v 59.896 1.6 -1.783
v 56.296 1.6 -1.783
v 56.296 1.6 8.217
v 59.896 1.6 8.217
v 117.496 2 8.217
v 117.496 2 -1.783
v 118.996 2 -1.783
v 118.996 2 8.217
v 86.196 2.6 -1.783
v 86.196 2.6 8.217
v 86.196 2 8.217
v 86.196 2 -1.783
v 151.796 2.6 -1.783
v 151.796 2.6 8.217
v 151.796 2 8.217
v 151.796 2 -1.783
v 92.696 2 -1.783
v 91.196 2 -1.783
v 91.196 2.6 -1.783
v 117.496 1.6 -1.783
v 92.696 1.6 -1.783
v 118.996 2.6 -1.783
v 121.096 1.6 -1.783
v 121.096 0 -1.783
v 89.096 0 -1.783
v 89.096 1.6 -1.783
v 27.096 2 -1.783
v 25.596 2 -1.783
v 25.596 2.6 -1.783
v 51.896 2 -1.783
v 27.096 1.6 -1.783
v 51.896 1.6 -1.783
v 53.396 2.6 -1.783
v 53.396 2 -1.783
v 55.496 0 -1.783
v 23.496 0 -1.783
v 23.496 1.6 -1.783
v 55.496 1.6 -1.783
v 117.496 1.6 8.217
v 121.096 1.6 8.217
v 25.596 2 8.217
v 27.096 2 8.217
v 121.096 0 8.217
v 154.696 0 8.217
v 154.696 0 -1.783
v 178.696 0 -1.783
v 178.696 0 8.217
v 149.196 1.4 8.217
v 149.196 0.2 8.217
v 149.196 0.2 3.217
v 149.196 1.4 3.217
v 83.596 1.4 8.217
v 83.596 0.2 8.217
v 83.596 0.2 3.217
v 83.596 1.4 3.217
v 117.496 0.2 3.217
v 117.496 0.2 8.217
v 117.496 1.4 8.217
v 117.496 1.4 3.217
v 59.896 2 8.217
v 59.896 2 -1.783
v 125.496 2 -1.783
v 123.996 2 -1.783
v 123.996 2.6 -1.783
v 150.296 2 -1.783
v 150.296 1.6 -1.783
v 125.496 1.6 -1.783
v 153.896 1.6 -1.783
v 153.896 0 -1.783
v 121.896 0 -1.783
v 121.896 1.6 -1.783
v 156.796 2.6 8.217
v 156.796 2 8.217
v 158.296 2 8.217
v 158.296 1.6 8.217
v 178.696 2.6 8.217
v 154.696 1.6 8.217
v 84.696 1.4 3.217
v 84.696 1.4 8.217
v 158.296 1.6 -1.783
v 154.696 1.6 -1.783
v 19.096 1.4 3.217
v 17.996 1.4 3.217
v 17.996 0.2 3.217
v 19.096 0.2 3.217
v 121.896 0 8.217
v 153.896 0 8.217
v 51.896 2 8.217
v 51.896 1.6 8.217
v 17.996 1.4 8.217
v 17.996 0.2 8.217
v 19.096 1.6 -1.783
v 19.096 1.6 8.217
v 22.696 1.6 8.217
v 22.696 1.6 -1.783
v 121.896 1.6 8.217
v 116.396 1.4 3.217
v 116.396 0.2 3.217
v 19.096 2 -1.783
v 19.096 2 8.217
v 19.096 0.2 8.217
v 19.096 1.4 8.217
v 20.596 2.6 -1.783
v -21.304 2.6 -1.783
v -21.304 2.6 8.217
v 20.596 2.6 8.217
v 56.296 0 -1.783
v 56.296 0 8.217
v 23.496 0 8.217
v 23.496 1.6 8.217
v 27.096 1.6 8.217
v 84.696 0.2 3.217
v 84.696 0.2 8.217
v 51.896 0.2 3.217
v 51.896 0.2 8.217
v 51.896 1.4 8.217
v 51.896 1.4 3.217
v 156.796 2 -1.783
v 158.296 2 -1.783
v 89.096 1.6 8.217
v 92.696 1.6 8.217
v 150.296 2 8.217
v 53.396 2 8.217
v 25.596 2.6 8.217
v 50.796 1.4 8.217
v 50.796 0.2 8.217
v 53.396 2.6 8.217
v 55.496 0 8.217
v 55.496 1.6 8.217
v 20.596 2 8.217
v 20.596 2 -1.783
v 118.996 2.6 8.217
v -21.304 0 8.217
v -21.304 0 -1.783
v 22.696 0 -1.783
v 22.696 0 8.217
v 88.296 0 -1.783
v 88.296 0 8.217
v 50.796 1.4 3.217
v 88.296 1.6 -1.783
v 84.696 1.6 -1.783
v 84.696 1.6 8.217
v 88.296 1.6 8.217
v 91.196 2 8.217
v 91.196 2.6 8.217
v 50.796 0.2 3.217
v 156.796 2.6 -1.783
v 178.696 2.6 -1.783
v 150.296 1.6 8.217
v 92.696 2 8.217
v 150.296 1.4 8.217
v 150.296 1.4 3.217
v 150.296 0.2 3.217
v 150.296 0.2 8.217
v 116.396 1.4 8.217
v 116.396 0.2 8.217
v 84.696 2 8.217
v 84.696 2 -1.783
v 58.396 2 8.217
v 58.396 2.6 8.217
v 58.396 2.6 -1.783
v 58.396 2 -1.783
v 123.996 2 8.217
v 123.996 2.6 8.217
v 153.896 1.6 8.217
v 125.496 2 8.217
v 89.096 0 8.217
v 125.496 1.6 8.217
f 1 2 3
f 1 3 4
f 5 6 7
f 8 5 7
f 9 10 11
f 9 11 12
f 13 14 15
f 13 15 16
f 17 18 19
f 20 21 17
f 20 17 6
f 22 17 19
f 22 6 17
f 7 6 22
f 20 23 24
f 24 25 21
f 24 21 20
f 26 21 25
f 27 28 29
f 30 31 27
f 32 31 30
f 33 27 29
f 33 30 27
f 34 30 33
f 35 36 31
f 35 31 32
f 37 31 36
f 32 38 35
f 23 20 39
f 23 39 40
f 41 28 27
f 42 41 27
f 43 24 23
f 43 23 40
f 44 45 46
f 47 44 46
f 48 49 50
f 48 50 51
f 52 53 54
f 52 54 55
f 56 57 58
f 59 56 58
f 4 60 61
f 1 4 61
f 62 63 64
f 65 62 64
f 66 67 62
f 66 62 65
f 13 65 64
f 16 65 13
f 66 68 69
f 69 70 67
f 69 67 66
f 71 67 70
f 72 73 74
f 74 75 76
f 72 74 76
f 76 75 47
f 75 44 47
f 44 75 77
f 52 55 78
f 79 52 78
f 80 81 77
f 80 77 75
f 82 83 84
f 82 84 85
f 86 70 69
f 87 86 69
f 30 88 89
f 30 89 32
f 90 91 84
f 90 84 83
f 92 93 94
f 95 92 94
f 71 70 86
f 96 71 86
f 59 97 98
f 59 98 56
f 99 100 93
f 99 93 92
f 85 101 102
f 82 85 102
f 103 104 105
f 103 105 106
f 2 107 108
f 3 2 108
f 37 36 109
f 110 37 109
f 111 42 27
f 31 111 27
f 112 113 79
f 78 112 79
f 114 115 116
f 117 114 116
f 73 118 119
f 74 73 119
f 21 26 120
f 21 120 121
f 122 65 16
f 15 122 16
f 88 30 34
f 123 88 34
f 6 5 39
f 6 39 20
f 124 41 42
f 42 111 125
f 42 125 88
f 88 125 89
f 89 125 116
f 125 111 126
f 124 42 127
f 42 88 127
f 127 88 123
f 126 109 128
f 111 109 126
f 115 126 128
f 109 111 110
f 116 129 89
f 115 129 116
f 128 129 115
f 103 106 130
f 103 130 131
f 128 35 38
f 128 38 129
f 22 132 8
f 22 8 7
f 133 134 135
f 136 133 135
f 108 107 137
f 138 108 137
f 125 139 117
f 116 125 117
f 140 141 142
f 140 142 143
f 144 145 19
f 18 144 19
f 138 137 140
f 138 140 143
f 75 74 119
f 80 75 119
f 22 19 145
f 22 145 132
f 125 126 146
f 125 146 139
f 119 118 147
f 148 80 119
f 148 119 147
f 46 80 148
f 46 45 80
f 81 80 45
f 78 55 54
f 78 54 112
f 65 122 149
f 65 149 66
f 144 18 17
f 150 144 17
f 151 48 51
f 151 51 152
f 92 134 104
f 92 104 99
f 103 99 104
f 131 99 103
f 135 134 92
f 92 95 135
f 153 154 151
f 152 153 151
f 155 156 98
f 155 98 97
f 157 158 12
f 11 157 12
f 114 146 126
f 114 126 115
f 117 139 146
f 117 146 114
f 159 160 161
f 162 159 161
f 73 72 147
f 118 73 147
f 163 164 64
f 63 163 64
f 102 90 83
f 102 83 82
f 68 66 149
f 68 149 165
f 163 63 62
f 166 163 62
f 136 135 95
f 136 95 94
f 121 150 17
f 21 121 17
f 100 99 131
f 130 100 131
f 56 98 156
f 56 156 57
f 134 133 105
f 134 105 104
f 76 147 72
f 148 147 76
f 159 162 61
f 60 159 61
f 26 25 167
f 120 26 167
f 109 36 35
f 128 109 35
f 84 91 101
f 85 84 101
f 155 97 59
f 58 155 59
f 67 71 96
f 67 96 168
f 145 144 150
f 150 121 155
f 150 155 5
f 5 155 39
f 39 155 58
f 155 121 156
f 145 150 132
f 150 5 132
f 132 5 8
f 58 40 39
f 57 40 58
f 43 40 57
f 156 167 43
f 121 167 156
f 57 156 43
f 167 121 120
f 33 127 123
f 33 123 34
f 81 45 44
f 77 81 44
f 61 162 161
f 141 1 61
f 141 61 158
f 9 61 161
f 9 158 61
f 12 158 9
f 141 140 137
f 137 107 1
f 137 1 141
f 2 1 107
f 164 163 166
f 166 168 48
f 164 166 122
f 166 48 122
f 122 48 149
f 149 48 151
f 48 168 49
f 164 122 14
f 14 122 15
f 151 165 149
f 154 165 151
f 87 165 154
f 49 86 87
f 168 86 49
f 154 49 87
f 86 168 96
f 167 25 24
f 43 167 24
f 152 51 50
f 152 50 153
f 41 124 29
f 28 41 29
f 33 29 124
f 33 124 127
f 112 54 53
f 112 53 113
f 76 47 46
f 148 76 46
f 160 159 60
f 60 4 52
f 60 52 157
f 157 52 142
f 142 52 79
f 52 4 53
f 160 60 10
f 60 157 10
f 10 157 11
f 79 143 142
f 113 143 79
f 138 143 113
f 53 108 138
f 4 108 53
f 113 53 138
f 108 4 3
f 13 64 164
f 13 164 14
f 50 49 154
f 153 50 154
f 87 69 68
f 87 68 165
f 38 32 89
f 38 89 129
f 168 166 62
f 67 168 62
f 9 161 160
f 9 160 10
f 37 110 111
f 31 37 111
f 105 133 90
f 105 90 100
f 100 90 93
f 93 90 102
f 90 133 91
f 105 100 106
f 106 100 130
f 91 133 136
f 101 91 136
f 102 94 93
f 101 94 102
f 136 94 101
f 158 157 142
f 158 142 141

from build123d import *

# Parameters (mm, degrees)
SKETCH1_W             = 200
SKETCH1_H             = 10
BOSS_EXTRUDE1_DEPTH   = 2.6
SKETCH3_W             = 0.8
SKETCH3_H             = 10
CUT_EXTRUDE1_DEPTH    = 2
SKETCH4_W             = 5
SKETCH4_H             = 10
CUT_EXTRUDE2_DEPTH    = 0.6
SKETCH5_W             = 5
SKETCH5_H             = 10
BOSS_EXTRUDE2_DEPTH   = 0.6
BOSS_EXTRUDE2_2_DEPTH = 0.6
BOSS_EXTRUDE2_3_DEPTH = 0.6
BOSS_EXTRUDE2_4_DEPTH = 0.6
BOSS_EXTRUDE2_5_DEPTH = 0.6
SKETCH6_W             = 3.6
SKETCH6_H             = 10
CUT_EXTRUDE3_DEPTH    = 0.4
SKETCH11_W            = 1.1
SKETCH11_H            = 1.2
CUT_EXTRUDE4_DEPTH    = 5
SKETCH12_W            = 5
SKETCH12_H            = 10
CUT_EXTRUDE6_DEPTH    = 0.6


with BuildPart() as part:
    # Sketch1 → Boss-Extrude1 (new body)
    with BuildSketch(Plane(origin=(0, 0, 0), x_dir=(1, 0, 0), z_dir=(0, 1, 0))):
        with Locations((78.695652174, -3.217391304)):
            Rectangle(SKETCH1_W, SKETCH1_H)
    extrude(amount=BOSS_EXTRUDE1_DEPTH)

    # Sketch3 → Cut-Extrude1 (cut)
    with BuildSketch(Plane.XZ):
        with Locations((23.095652174, 3.217391304)):
            Rectangle(SKETCH3_W, SKETCH3_H)
        with Locations((55.895652174, 3.217391304)):
            Rectangle(SKETCH3_W, SKETCH3_H)
        with Locations((88.695652174, 3.217391304)):
            Rectangle(SKETCH3_W, SKETCH3_H)
        with Locations((121.495652174, 3.217391304)):
            Rectangle(SKETCH3_W, SKETCH3_H)
        with Locations((154.295652174, 3.217391304)):
            Rectangle(SKETCH3_W, SKETCH3_H)
    extrude(amount=-CUT_EXTRUDE1_DEPTH, mode=Mode.SUBTRACT)

    # Sketch4 → Cut-Extrude2 (cut)
    with BuildSketch(Plane(origin=(0, 2.6, 0), x_dir=(1, 0, 0), z_dir=(0, 1, 0))):
        with Locations((154.295652174, -3.217391304)):
            Rectangle(SKETCH4_W, SKETCH4_H)
        with Locations((121.495652174, -3.217391304)):
            Rectangle(SKETCH4_W, SKETCH4_H)
        with Locations((88.695652174, -3.217391304)):
            Rectangle(SKETCH4_W, SKETCH4_H)
        with Locations((55.895652174, -3.217391304)):
            Rectangle(SKETCH4_W, SKETCH4_H)
        with Locations((23.095652174, -3.217391304)):
            Rectangle(SKETCH4_W, SKETCH4_H)
    extrude(amount=-CUT_EXTRUDE2_DEPTH, mode=Mode.SUBTRACT)


with BuildPart() as cut_extrude2_piece_1:
    # of the separate pieces the step leaves, piece 1, a body of its own (cut_extrude2_pieces)
    add(part.part.solids().sort_by_distance((-21.304347826, 0, 8.217391304))[0])


with BuildPart() as cut_extrude2_piece_2:
    # of the separate pieces the step leaves, piece 2, a body of its own (cut_extrude2_pieces)
    add(part.part.solids().sort_by_distance((91.195652174, 2.6, 8.217391304))[0])


with BuildPart() as cut_extrude2_piece_3:
    # of the separate pieces the step leaves, piece 3, a body of its own (cut_extrude2_pieces)
    add(part.part.solids().sort_by_distance((23.495652174, 0, 8.217391304))[0])


with BuildPart() as cut_extrude2_piece_4:
    # of the separate pieces the step leaves, piece 4, a body of its own (cut_extrude2_pieces)
    add(part.part.solids().sort_by_distance((58.395652174, 2.6, 8.217391304))[0])


with BuildPart() as cut_extrude2_piece_5:
    # of the separate pieces the step leaves, piece 5, a body of its own (cut_extrude2_pieces)
    add(part.part.solids().sort_by_distance((123.995652174, 2.6, 8.217391304))[0])


with BuildPart() as cut_extrude2_piece_6:
    # of the separate pieces the step leaves, piece 6, a body of its own (cut_extrude2_pieces)
    add(part.part.solids().sort_by_distance((156.795652174, 2.6, 8.217391304))[0])


with BuildPart() as body_7:
    # Sketch5 → Boss-Extrude2 (new body)
    with BuildSketch(Plane(origin=(0, 2, 0), x_dir=(1, 0, 0), z_dir=(0, 1, 0))):
        with Locations((88.695652174, -3.217391304)):
            Rectangle(SKETCH5_W, SKETCH5_H)
    extrude(amount=BOSS_EXTRUDE2_DEPTH)


with BuildPart() as body_8:
    # Sketch5 → Boss-Extrude2 2 (new body)
    with BuildSketch(Plane(origin=(0, 2, 0), x_dir=(1, 0, 0), z_dir=(0, 1, 0))):
        with Locations((121.495652174, -3.217391304)):
            Rectangle(SKETCH5_W, SKETCH5_H)
    extrude(amount=BOSS_EXTRUDE2_2_DEPTH)


with BuildPart() as body_9:
    # Sketch5 → Boss-Extrude2 3 (new body)
    with BuildSketch(Plane(origin=(0, 2, 0), x_dir=(1, 0, 0), z_dir=(0, 1, 0))):
        with Locations((154.295652174, -3.217391304)):
            Rectangle(SKETCH5_W, SKETCH5_H)
    extrude(amount=BOSS_EXTRUDE2_3_DEPTH)


with BuildPart() as body_10:
    # Sketch5 → Boss-Extrude2 4 (new body)
    with BuildSketch(Plane(origin=(0, 2, 0), x_dir=(1, 0, 0), z_dir=(0, 1, 0))):
        with Locations((55.895652174, -3.217391304)):
            Rectangle(SKETCH5_W, SKETCH5_H)
    extrude(amount=BOSS_EXTRUDE2_4_DEPTH)


with BuildPart() as body_11:
    # Sketch5 → Boss-Extrude2 5 (new body)
    with BuildSketch(Plane(origin=(0, 2, 0), x_dir=(1, 0, 0), z_dir=(0, 1, 0))):
        with Locations((23.095652174, -3.217391304)):
            Rectangle(SKETCH5_W, SKETCH5_H)
    extrude(amount=BOSS_EXTRUDE2_5_DEPTH)


with BuildPart() as cut_extrude3_tool:
    # Sketch6 → Cut-Extrude3 (new body)
    with BuildSketch(Plane(origin=(0, 2, 0), x_dir=(1, 0, 0), z_dir=(0, 1, 0))):
        with Locations((156.495652174, -3.217391304)):
            Rectangle(SKETCH6_W, SKETCH6_H)
        with Locations((25.295652174, -3.217391304)):
            Rectangle(SKETCH6_W, SKETCH6_H)
        with Locations((152.095652174, -3.217391304)):
            Rectangle(SKETCH6_W, SKETCH6_H)
        with Locations((123.695652174, -3.217391304)):
            Rectangle(SKETCH6_W, SKETCH6_H)
        with Locations((119.295652174, -3.217391304)):
            Rectangle(SKETCH6_W, SKETCH6_H)
        with Locations((90.895652174, -3.217391304)):
            Rectangle(SKETCH6_W, SKETCH6_H)
        with Locations((86.495652174, -3.217391304)):
            Rectangle(SKETCH6_W, SKETCH6_H)
        with Locations((58.095652174, -3.217391304)):
            Rectangle(SKETCH6_W, SKETCH6_H)
        with Locations((53.695652174, -3.217391304)):
            Rectangle(SKETCH6_W, SKETCH6_H)
        with Locations((20.895652174, -3.217391304)):
            Rectangle(SKETCH6_W, SKETCH6_H)
    extrude(amount=-CUT_EXTRUDE3_DEPTH)


with BuildPart() as cut_extrude2_piece_1_1:
    add(cut_extrude2_piece_1.part)

    # Cut-Extrude3: cut by cut_extrude3_tool
    add(cut_extrude3_tool.part, mode=Mode.SUBTRACT)


with BuildPart() as cut_extrude2_piece_2_1:
    add(cut_extrude2_piece_2.part)

    # Cut-Extrude3: cut by cut_extrude3_tool
    add(cut_extrude3_tool.part, mode=Mode.SUBTRACT)


with BuildPart() as cut_extrude2_piece_3_1:
    add(cut_extrude2_piece_3.part)

    # Cut-Extrude3: cut by cut_extrude3_tool
    add(cut_extrude3_tool.part, mode=Mode.SUBTRACT)


with BuildPart() as cut_extrude2_piece_4_1:
    add(cut_extrude2_piece_4.part)

    # Cut-Extrude3: cut by cut_extrude3_tool
    add(cut_extrude3_tool.part, mode=Mode.SUBTRACT)


with BuildPart() as cut_extrude2_piece_5_1:
    add(cut_extrude2_piece_5.part)

    # Cut-Extrude3: cut by cut_extrude3_tool
    add(cut_extrude3_tool.part, mode=Mode.SUBTRACT)


with BuildPart() as cut_extrude2_piece_6_1:
    add(cut_extrude2_piece_6.part)

    # Cut-Extrude3: cut by cut_extrude3_tool
    add(cut_extrude3_tool.part, mode=Mode.SUBTRACT)


with BuildPart() as cut_extrude4_tool:
    # Sketch11 → Cut-Extrude4 (new body)
    with BuildSketch(Plane.XY.offset(8.217391304)):
        with Locations((18.545652174, 0.8)):
            Rectangle(SKETCH11_W, SKETCH11_H)
        with Locations((51.345652174, 0.8)):
            Rectangle(SKETCH11_W, SKETCH11_H)
        with Locations((84.145652174, 0.8)):
            Rectangle(SKETCH11_W, SKETCH11_H)
        with Locations((116.945652174, 0.8)):
            Rectangle(SKETCH11_W, SKETCH11_H)
        with Locations((149.745652174, 0.8)):
            Rectangle(SKETCH11_W, SKETCH11_H)
    extrude(amount=-CUT_EXTRUDE4_DEPTH)


with BuildPart() as cut_extrude2_piece_1_2:
    add(cut_extrude2_piece_1_1.part)

    # Cut-Extrude4: cut by cut_extrude4_tool
    add(cut_extrude4_tool.part, mode=Mode.SUBTRACT)


with BuildPart() as cut_extrude2_piece_2_2:
    add(cut_extrude2_piece_2_1.part)

    # Cut-Extrude4: cut by cut_extrude4_tool
    add(cut_extrude4_tool.part, mode=Mode.SUBTRACT)


with BuildPart() as cut_extrude2_piece_3_2:
    add(cut_extrude2_piece_3_1.part)

    # Cut-Extrude4: cut by cut_extrude4_tool
    add(cut_extrude4_tool.part, mode=Mode.SUBTRACT)


with BuildPart() as cut_extrude2_piece_4_2:
    add(cut_extrude2_piece_4_1.part)

    # Cut-Extrude4: cut by cut_extrude4_tool
    add(cut_extrude4_tool.part, mode=Mode.SUBTRACT)


with BuildPart() as cut_extrude2_piece_5_2:
    add(cut_extrude2_piece_5_1.part)

    # Cut-Extrude4: cut by cut_extrude4_tool
    add(cut_extrude4_tool.part, mode=Mode.SUBTRACT)


with BuildPart() as cut_extrude6_tool:
    # Sketch12 → Cut-Extrude6 (new body)
    with BuildSketch(Plane(origin=(0, 2.6, 0), x_dir=(1, 0, 0), z_dir=(0, 1, 0))):
        with Locations((23.095652174, -3.217391304)):
            Rectangle(SKETCH12_W, SKETCH12_H)
        with Locations((55.895652174, -3.217391304)):
            Rectangle(SKETCH12_W, SKETCH12_H)
        with Locations((88.695652174, -3.217391304)):
            Rectangle(SKETCH12_W, SKETCH12_H)
        with Locations((121.495652174, -3.217391304)):
            Rectangle(SKETCH12_W, SKETCH12_H)
        with Locations((154.295652174, -3.217391304)):
            Rectangle(SKETCH12_W, SKETCH12_H)
    extrude(amount=-CUT_EXTRUDE6_DEPTH)


with BuildPart() as body_7_1:
    add(body_7.part)

    # Cut-Extrude6: cut by cut_extrude6_tool
    add(cut_extrude6_tool.part, mode=Mode.SUBTRACT)


with BuildPart() as body_8_1:
    add(body_8.part)

    # Cut-Extrude6: cut by cut_extrude6_tool
    add(cut_extrude6_tool.part, mode=Mode.SUBTRACT)


with BuildPart() as body_9_1:
    add(body_9.part)

    # Cut-Extrude6: cut by cut_extrude6_tool
    add(cut_extrude6_tool.part, mode=Mode.SUBTRACT)


with BuildPart() as body_10_1:
    add(body_10.part)

    # Cut-Extrude6: cut by cut_extrude6_tool
    add(cut_extrude6_tool.part, mode=Mode.SUBTRACT)


with BuildPart() as body_11_1:
    add(body_11.part)

    # Cut-Extrude6: cut by cut_extrude6_tool
    add(cut_extrude6_tool.part, mode=Mode.SUBTRACT)


solid = Compound([cut_extrude2_piece_6_1.part, cut_extrude2_piece_1_2.part, cut_extrude2_piece_2_2.part, cut_extrude2_piece_3_2.part, cut_extrude2_piece_4_2.part, cut_extrude2_piece_5_2.part])
